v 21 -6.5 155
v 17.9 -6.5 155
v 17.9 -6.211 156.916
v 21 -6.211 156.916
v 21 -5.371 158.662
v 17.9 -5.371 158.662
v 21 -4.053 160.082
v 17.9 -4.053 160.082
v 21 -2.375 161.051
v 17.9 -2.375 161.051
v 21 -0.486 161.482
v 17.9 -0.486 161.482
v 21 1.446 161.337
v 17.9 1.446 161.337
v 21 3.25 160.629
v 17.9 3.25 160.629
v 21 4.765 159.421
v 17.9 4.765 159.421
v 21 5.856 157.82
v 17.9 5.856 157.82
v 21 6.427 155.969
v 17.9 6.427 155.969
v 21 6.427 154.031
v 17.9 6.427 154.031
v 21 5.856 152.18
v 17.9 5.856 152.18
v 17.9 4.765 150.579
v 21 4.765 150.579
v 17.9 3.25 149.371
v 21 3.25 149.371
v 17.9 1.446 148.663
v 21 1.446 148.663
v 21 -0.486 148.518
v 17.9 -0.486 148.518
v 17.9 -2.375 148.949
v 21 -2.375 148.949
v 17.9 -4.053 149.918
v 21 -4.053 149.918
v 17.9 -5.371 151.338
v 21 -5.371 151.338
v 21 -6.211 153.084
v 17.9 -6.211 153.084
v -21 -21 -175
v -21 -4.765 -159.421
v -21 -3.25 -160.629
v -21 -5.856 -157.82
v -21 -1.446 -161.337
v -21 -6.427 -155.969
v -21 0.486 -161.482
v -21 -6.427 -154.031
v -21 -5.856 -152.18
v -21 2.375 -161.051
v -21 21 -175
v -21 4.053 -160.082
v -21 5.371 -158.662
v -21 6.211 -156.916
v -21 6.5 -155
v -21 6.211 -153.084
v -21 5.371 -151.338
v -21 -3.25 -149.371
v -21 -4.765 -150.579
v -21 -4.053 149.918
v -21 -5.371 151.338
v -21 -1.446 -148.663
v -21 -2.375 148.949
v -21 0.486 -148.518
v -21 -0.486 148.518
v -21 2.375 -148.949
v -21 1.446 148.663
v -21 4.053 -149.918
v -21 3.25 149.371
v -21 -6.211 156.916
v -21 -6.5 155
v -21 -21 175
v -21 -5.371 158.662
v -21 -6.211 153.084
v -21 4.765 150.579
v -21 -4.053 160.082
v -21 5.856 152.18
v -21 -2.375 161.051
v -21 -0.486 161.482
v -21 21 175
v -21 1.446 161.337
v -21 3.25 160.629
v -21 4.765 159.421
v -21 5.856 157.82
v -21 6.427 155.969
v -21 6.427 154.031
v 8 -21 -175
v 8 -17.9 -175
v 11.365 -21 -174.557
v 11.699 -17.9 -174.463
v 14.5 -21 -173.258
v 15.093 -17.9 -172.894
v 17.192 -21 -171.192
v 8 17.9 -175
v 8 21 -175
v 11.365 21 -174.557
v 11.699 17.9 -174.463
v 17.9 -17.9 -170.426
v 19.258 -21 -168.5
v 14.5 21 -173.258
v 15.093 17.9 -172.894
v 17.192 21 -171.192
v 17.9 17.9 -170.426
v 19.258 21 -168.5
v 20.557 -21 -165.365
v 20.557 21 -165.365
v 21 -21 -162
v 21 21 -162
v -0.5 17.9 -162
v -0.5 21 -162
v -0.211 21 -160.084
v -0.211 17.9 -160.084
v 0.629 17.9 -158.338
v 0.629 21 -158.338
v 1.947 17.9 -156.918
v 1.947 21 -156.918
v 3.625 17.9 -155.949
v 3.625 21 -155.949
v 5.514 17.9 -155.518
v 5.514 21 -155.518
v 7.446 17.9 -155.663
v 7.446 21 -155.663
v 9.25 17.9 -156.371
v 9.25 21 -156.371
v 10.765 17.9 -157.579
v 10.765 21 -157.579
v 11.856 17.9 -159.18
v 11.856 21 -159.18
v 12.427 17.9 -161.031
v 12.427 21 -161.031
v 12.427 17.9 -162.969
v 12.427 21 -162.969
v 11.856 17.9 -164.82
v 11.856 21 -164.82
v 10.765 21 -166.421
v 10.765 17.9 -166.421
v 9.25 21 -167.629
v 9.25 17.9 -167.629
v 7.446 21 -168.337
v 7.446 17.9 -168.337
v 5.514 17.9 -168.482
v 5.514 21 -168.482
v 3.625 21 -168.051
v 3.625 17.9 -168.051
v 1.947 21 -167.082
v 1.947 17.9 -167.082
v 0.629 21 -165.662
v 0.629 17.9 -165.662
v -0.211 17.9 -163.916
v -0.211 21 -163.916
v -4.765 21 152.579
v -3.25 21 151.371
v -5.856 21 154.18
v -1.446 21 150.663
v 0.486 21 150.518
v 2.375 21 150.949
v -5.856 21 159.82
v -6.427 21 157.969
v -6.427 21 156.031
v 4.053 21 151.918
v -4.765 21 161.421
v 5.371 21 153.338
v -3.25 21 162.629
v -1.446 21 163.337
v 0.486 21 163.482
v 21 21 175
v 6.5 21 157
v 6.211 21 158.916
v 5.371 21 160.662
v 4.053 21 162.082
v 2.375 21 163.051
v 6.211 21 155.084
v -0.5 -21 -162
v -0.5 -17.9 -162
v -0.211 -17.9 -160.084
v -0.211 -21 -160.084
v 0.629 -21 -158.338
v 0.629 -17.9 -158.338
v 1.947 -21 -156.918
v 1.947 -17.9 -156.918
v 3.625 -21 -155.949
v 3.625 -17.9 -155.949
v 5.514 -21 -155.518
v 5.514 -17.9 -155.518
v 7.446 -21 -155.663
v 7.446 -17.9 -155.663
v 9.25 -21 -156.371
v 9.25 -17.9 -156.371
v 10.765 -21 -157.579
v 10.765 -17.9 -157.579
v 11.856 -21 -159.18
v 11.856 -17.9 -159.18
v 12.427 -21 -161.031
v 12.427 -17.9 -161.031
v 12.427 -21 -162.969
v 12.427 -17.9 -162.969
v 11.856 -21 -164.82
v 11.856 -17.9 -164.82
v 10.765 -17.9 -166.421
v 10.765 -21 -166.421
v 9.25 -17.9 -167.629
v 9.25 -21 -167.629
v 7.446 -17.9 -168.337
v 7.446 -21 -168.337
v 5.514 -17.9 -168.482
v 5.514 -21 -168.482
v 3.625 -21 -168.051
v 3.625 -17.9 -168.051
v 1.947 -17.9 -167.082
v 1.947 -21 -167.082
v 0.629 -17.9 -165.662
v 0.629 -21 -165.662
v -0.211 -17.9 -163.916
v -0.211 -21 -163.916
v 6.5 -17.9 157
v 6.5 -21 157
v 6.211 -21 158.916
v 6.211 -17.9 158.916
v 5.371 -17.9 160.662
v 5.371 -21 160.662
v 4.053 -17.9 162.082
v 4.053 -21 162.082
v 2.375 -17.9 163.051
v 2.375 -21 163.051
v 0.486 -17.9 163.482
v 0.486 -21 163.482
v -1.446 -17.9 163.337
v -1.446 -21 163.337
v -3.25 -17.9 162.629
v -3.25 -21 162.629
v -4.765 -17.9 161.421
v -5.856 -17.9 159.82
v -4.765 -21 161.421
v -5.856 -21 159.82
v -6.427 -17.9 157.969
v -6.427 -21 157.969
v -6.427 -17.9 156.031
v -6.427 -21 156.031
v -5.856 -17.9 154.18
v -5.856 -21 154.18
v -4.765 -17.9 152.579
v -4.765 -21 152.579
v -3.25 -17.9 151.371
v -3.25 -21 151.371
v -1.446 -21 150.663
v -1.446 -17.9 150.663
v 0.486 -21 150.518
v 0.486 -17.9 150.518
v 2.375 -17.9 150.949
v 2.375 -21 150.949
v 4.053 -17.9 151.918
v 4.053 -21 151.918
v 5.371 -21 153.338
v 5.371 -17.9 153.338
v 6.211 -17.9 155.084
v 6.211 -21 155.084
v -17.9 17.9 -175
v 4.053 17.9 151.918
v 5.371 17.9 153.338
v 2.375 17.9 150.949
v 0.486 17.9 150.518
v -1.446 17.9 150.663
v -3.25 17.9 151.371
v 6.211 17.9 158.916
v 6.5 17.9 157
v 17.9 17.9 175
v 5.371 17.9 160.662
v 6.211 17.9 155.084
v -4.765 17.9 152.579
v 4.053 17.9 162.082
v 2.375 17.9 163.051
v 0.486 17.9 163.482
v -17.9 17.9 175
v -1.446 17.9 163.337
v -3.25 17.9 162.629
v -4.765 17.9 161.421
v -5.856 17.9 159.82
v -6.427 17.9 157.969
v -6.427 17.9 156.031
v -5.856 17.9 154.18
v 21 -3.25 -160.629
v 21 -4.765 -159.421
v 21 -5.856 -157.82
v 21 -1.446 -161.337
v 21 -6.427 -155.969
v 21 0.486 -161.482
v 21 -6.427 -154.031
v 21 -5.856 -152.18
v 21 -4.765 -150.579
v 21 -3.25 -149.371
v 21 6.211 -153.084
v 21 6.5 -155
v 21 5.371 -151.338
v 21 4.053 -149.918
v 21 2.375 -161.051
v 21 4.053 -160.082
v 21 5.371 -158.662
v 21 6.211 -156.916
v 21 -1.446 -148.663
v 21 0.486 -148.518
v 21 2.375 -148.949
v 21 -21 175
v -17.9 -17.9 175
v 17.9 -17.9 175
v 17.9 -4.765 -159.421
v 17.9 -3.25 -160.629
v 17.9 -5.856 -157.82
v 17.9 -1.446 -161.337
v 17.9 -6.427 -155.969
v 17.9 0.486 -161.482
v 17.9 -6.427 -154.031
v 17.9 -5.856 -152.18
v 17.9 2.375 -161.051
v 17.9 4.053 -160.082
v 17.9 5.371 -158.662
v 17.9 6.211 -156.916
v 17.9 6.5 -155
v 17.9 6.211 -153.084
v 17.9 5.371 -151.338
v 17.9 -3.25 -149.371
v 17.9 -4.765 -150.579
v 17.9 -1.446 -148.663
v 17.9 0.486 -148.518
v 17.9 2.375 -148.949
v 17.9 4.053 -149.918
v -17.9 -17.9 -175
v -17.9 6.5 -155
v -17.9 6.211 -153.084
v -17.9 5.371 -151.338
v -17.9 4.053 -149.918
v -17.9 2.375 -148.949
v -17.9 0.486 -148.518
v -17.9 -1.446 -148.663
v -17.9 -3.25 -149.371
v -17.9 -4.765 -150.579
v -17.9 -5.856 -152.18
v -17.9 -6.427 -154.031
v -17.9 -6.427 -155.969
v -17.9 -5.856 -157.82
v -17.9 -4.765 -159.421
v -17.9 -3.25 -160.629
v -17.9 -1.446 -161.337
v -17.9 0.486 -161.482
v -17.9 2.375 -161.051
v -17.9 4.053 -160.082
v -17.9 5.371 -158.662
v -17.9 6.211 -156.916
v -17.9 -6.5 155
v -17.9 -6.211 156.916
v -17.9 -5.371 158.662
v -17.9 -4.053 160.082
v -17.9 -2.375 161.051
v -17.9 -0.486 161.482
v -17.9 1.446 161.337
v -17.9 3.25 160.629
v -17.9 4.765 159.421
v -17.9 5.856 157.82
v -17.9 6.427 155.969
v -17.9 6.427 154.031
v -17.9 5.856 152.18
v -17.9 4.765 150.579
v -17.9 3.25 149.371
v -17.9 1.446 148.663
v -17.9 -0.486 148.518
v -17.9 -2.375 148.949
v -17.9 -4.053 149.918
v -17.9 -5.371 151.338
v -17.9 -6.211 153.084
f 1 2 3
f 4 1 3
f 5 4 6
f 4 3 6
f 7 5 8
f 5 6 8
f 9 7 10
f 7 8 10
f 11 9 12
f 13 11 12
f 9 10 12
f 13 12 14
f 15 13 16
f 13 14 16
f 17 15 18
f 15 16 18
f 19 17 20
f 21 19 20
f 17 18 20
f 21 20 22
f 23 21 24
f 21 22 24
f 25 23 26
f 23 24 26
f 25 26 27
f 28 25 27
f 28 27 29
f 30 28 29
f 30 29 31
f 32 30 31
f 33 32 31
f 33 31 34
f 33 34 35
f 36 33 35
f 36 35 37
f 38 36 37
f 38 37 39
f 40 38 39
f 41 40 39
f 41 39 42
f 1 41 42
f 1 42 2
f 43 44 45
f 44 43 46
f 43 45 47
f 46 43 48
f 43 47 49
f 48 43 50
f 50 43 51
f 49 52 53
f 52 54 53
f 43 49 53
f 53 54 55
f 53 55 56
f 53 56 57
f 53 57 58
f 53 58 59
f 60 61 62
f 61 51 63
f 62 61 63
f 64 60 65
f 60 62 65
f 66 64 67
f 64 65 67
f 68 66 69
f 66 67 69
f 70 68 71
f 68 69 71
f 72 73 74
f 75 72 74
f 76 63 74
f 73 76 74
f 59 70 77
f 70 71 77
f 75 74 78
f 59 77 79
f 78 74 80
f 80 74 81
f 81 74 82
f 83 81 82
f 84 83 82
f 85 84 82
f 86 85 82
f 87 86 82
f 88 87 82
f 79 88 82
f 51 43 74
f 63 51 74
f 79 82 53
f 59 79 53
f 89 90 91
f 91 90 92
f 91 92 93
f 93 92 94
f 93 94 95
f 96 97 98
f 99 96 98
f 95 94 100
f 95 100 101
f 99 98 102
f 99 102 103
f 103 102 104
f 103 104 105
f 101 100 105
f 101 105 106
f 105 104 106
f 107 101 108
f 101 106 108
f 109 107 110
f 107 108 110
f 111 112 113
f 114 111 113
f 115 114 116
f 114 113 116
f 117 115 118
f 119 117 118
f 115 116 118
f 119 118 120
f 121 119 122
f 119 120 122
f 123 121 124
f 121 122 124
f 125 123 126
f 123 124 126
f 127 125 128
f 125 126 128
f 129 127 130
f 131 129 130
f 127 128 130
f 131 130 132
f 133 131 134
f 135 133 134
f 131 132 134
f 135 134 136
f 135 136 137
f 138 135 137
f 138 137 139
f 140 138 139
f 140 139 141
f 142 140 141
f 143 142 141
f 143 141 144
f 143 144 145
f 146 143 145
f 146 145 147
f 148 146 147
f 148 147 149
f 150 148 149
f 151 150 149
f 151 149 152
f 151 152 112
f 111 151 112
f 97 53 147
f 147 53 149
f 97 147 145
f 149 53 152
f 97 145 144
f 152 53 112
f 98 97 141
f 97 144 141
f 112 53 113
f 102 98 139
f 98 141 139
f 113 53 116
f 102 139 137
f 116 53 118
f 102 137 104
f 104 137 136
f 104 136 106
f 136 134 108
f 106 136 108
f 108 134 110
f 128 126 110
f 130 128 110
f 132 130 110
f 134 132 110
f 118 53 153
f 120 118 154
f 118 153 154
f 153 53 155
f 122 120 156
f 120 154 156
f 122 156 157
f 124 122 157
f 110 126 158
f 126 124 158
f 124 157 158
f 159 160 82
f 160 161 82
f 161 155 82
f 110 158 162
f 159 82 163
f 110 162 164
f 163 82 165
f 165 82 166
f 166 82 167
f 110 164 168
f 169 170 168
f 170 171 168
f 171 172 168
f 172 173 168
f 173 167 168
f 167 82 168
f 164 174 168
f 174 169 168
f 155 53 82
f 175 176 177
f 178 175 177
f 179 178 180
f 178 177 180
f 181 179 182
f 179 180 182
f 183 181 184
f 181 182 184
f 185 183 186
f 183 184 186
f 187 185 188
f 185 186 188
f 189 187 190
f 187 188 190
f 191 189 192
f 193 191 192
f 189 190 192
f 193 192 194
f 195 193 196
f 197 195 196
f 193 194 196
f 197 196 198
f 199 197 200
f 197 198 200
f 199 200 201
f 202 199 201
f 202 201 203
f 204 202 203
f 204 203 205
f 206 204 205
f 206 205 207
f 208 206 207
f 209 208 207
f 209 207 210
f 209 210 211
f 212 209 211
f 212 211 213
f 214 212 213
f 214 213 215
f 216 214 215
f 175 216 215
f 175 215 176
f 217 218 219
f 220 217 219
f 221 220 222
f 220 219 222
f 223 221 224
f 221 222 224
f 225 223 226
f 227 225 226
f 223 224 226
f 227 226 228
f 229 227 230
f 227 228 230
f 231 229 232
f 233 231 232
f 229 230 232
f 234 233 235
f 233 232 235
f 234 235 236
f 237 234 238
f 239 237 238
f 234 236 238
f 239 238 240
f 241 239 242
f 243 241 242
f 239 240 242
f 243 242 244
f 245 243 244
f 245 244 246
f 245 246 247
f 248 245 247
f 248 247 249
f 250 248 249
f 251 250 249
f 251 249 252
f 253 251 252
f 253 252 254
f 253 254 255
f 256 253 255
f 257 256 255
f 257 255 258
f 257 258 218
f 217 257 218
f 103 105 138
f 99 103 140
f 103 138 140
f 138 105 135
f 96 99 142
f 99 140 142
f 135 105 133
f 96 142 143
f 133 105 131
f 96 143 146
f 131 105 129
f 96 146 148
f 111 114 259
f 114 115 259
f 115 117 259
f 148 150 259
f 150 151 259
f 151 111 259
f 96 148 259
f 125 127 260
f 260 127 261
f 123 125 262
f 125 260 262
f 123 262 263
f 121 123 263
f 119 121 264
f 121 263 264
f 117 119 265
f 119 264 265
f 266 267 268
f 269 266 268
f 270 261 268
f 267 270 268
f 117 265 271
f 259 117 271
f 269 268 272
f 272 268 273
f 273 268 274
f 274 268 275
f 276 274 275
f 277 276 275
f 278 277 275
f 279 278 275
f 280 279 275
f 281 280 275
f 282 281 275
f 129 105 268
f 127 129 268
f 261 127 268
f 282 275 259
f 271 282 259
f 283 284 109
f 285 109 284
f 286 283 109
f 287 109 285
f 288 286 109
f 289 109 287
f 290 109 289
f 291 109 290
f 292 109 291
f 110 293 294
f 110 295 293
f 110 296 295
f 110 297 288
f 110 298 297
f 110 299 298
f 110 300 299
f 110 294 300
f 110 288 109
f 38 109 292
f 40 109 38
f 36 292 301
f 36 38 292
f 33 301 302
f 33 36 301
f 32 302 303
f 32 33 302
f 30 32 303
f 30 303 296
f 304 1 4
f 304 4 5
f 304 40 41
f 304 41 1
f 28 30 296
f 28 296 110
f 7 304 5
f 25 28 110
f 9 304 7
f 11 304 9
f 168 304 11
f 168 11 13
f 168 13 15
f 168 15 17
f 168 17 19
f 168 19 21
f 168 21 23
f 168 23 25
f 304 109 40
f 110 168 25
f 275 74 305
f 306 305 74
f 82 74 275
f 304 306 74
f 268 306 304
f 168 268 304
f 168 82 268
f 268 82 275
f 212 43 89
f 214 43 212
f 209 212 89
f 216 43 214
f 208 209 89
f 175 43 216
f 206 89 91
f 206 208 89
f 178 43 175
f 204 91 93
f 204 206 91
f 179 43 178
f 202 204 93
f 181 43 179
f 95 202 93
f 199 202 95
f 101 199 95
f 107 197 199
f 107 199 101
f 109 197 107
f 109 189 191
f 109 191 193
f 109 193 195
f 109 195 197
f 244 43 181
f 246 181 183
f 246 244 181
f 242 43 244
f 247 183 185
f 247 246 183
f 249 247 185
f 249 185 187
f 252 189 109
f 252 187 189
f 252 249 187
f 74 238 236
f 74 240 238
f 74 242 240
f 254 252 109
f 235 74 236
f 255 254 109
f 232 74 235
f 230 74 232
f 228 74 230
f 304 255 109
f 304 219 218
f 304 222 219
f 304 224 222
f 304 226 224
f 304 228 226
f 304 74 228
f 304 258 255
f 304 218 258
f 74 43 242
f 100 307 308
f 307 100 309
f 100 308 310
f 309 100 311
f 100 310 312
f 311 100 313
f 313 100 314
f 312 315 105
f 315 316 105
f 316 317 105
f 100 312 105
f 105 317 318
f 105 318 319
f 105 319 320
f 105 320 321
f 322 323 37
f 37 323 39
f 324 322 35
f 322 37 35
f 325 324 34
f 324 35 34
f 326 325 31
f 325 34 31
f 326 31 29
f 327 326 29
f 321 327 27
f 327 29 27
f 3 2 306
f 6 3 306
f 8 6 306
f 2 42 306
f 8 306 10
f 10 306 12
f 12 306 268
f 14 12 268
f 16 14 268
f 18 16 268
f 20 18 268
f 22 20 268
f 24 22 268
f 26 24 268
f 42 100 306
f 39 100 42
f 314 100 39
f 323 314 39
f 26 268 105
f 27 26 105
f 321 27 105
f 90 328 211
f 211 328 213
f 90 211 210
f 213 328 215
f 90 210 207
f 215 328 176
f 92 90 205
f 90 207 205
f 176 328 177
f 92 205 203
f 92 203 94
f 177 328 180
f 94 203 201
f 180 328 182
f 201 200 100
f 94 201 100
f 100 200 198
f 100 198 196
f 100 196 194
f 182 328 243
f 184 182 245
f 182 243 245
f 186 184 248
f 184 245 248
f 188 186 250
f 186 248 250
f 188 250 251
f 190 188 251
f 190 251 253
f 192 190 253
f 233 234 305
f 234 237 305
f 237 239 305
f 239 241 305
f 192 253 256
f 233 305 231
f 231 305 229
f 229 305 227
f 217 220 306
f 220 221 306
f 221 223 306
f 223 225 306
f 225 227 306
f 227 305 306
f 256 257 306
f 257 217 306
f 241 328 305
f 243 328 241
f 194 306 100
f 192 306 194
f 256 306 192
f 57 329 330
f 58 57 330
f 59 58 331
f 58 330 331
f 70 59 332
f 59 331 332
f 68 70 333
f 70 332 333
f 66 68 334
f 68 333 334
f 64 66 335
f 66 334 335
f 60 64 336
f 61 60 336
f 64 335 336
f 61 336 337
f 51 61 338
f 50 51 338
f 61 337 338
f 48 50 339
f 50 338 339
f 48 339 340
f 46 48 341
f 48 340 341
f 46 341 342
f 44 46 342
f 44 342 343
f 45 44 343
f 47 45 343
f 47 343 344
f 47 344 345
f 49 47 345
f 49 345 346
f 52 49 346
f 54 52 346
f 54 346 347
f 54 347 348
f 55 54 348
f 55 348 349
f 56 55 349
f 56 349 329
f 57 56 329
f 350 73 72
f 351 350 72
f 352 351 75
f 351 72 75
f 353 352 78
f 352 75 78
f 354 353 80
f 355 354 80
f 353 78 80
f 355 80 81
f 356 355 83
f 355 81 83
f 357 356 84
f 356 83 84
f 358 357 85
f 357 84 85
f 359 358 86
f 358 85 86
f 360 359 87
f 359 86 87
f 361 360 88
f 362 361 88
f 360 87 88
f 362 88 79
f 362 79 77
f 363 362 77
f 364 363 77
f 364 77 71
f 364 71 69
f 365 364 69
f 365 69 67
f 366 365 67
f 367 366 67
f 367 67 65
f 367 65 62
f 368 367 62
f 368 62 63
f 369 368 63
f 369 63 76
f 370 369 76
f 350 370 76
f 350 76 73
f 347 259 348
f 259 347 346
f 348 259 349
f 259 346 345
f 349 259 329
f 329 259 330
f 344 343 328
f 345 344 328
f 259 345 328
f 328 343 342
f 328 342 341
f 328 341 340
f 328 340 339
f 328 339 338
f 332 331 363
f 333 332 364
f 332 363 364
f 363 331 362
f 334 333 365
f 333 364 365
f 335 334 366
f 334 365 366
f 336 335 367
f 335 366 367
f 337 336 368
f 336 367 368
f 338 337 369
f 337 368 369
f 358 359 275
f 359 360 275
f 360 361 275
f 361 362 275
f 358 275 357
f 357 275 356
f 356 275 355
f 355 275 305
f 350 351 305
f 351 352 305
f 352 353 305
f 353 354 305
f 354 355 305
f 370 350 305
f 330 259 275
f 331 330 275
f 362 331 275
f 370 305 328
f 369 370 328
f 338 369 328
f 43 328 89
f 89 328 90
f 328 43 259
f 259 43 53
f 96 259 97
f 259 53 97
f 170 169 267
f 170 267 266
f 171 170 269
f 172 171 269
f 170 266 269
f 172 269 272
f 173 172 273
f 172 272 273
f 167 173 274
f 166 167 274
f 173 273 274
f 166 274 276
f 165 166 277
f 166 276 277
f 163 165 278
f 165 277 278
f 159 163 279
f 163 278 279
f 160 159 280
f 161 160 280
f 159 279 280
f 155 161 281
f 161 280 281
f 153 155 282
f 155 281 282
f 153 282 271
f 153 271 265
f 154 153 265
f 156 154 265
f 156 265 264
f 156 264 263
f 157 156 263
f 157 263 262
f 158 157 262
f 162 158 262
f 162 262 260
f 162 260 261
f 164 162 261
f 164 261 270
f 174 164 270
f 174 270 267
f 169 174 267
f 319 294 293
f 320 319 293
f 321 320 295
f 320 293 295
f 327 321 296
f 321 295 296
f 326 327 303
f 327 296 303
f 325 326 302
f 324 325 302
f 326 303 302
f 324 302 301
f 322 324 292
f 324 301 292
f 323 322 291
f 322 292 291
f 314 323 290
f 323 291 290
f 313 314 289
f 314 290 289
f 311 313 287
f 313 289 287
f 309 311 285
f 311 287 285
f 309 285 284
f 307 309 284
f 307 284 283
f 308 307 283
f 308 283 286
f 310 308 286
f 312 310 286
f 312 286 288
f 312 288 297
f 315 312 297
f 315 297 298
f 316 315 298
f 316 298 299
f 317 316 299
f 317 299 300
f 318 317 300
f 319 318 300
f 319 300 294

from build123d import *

# Parameters (mm, degrees)
CROQUIS1_W              = 42
CROQUIS1_H              = 42
SALIENTE_EXTRUIR1_DEPTH = 175
CORTAR_EXTRUIR1_DEPTH   = 355.297078735
CROQUIS3_R              = 6.5
CORTAR_EXTRUIR3_DEPTH   = 60
CROQUIS4_R              = 6.5
CORTAR_EXTRUIR4_DEPTH   = 70
CROQUIS5_R              = 6.5
CORTAR_EXTRUIR5_DEPTH   = 182.190507478
REDONDEO1_R             = 13
CROQUIS6_R              = 6.5
CORTAR_EXTRUIR6_DEPTH   = 60


with BuildPart() as part:
    # Croquis1 → Saliente-Extruir1 (new, symmetric)
    with BuildSketch(Plane.XY):
        Rectangle(CROQUIS1_W, CROQUIS1_H)
    extrude(amount=SALIENTE_EXTRUIR1_DEPTH, both=True)

    # Croquis3D1 → Cortar-Extruir1 (cut, through all)
    with BuildSketch(Plane(origin=(-17.9, -17.9, 175), x_dir=(0.7071067811865475, 0.7071067811865477, 0), z_dir=(0, 0, 1))):
        Polygon((0, 0), (25.314422766, -25.314422766), (50.628845533, 0), (25.314422766, 25.314422766), align=None)
    extrude(amount=-CORTAR_EXTRUIR1_DEPTH, mode=Mode.SUBTRACT)

    # Croquis3 → Cortar-Extruir3 (cut)
    with BuildSketch(Plane.XZ.offset(21)):
        with Locations((0, 157)):
            Circle(CROQUIS3_R)
    extrude(amount=-CORTAR_EXTRUIR3_DEPTH, mode=Mode.SUBTRACT)

    # Croquis4 → Cortar-Extruir4 (cut)
    with BuildSketch(Plane(origin=(21, 0, 0), x_dir=(0, 0, -1), z_dir=(1, 0, 0))):
        with Locations(Location((155, 0, 0), (0, 0, 90))):
            Circle(CROQUIS4_R)
    extrude(amount=-CORTAR_EXTRUIR4_DEPTH, mode=Mode.SUBTRACT)

    # Croquis5 → Cortar-Extruir5 (cut, through all)
    with BuildSketch(Plane(origin=(0, 21, 0), x_dir=(1, 0, 0), z_dir=(0, 1, 0))):
        with Locations(Location((6, 162, 0), (0, 0, 180))):
            Circle(CROQUIS5_R)
    extrude(amount=-CORTAR_EXTRUIR5_DEPTH, mode=Mode.SUBTRACT)

    # Redondeo1
    # the kernel refuses this fillet: 13 mm, written as the material it takes off along each edge
    with BuildSketch(Plane(origin=(21, 53.5, -175), x_dir=(0, 0, 1), z_dir=(0, -1, 0))) as redondeo1_piece_1:
        with BuildLine():
            CenterArc((REDONDEO1_R, REDONDEO1_R), REDONDEO1_R, 180, 90)
            Line((0, REDONDEO1_R), (0, 0))
            Line((0, 0), (REDONDEO1_R, 0))
        make_face()
    extrude(amount=107, mode=Mode.SUBTRACT)

    # Croquis6 → Cortar-Extruir6 (cut)
    with BuildSketch(Plane.ZY.offset(21)):
        with Locations(Location((155, 0, 0), (0, 0, 270))):
            Circle(CROQUIS6_R)
    extrude(amount=-CORTAR_EXTRUIR6_DEPTH, mode=Mode.SUBTRACT)


solid = part.part
